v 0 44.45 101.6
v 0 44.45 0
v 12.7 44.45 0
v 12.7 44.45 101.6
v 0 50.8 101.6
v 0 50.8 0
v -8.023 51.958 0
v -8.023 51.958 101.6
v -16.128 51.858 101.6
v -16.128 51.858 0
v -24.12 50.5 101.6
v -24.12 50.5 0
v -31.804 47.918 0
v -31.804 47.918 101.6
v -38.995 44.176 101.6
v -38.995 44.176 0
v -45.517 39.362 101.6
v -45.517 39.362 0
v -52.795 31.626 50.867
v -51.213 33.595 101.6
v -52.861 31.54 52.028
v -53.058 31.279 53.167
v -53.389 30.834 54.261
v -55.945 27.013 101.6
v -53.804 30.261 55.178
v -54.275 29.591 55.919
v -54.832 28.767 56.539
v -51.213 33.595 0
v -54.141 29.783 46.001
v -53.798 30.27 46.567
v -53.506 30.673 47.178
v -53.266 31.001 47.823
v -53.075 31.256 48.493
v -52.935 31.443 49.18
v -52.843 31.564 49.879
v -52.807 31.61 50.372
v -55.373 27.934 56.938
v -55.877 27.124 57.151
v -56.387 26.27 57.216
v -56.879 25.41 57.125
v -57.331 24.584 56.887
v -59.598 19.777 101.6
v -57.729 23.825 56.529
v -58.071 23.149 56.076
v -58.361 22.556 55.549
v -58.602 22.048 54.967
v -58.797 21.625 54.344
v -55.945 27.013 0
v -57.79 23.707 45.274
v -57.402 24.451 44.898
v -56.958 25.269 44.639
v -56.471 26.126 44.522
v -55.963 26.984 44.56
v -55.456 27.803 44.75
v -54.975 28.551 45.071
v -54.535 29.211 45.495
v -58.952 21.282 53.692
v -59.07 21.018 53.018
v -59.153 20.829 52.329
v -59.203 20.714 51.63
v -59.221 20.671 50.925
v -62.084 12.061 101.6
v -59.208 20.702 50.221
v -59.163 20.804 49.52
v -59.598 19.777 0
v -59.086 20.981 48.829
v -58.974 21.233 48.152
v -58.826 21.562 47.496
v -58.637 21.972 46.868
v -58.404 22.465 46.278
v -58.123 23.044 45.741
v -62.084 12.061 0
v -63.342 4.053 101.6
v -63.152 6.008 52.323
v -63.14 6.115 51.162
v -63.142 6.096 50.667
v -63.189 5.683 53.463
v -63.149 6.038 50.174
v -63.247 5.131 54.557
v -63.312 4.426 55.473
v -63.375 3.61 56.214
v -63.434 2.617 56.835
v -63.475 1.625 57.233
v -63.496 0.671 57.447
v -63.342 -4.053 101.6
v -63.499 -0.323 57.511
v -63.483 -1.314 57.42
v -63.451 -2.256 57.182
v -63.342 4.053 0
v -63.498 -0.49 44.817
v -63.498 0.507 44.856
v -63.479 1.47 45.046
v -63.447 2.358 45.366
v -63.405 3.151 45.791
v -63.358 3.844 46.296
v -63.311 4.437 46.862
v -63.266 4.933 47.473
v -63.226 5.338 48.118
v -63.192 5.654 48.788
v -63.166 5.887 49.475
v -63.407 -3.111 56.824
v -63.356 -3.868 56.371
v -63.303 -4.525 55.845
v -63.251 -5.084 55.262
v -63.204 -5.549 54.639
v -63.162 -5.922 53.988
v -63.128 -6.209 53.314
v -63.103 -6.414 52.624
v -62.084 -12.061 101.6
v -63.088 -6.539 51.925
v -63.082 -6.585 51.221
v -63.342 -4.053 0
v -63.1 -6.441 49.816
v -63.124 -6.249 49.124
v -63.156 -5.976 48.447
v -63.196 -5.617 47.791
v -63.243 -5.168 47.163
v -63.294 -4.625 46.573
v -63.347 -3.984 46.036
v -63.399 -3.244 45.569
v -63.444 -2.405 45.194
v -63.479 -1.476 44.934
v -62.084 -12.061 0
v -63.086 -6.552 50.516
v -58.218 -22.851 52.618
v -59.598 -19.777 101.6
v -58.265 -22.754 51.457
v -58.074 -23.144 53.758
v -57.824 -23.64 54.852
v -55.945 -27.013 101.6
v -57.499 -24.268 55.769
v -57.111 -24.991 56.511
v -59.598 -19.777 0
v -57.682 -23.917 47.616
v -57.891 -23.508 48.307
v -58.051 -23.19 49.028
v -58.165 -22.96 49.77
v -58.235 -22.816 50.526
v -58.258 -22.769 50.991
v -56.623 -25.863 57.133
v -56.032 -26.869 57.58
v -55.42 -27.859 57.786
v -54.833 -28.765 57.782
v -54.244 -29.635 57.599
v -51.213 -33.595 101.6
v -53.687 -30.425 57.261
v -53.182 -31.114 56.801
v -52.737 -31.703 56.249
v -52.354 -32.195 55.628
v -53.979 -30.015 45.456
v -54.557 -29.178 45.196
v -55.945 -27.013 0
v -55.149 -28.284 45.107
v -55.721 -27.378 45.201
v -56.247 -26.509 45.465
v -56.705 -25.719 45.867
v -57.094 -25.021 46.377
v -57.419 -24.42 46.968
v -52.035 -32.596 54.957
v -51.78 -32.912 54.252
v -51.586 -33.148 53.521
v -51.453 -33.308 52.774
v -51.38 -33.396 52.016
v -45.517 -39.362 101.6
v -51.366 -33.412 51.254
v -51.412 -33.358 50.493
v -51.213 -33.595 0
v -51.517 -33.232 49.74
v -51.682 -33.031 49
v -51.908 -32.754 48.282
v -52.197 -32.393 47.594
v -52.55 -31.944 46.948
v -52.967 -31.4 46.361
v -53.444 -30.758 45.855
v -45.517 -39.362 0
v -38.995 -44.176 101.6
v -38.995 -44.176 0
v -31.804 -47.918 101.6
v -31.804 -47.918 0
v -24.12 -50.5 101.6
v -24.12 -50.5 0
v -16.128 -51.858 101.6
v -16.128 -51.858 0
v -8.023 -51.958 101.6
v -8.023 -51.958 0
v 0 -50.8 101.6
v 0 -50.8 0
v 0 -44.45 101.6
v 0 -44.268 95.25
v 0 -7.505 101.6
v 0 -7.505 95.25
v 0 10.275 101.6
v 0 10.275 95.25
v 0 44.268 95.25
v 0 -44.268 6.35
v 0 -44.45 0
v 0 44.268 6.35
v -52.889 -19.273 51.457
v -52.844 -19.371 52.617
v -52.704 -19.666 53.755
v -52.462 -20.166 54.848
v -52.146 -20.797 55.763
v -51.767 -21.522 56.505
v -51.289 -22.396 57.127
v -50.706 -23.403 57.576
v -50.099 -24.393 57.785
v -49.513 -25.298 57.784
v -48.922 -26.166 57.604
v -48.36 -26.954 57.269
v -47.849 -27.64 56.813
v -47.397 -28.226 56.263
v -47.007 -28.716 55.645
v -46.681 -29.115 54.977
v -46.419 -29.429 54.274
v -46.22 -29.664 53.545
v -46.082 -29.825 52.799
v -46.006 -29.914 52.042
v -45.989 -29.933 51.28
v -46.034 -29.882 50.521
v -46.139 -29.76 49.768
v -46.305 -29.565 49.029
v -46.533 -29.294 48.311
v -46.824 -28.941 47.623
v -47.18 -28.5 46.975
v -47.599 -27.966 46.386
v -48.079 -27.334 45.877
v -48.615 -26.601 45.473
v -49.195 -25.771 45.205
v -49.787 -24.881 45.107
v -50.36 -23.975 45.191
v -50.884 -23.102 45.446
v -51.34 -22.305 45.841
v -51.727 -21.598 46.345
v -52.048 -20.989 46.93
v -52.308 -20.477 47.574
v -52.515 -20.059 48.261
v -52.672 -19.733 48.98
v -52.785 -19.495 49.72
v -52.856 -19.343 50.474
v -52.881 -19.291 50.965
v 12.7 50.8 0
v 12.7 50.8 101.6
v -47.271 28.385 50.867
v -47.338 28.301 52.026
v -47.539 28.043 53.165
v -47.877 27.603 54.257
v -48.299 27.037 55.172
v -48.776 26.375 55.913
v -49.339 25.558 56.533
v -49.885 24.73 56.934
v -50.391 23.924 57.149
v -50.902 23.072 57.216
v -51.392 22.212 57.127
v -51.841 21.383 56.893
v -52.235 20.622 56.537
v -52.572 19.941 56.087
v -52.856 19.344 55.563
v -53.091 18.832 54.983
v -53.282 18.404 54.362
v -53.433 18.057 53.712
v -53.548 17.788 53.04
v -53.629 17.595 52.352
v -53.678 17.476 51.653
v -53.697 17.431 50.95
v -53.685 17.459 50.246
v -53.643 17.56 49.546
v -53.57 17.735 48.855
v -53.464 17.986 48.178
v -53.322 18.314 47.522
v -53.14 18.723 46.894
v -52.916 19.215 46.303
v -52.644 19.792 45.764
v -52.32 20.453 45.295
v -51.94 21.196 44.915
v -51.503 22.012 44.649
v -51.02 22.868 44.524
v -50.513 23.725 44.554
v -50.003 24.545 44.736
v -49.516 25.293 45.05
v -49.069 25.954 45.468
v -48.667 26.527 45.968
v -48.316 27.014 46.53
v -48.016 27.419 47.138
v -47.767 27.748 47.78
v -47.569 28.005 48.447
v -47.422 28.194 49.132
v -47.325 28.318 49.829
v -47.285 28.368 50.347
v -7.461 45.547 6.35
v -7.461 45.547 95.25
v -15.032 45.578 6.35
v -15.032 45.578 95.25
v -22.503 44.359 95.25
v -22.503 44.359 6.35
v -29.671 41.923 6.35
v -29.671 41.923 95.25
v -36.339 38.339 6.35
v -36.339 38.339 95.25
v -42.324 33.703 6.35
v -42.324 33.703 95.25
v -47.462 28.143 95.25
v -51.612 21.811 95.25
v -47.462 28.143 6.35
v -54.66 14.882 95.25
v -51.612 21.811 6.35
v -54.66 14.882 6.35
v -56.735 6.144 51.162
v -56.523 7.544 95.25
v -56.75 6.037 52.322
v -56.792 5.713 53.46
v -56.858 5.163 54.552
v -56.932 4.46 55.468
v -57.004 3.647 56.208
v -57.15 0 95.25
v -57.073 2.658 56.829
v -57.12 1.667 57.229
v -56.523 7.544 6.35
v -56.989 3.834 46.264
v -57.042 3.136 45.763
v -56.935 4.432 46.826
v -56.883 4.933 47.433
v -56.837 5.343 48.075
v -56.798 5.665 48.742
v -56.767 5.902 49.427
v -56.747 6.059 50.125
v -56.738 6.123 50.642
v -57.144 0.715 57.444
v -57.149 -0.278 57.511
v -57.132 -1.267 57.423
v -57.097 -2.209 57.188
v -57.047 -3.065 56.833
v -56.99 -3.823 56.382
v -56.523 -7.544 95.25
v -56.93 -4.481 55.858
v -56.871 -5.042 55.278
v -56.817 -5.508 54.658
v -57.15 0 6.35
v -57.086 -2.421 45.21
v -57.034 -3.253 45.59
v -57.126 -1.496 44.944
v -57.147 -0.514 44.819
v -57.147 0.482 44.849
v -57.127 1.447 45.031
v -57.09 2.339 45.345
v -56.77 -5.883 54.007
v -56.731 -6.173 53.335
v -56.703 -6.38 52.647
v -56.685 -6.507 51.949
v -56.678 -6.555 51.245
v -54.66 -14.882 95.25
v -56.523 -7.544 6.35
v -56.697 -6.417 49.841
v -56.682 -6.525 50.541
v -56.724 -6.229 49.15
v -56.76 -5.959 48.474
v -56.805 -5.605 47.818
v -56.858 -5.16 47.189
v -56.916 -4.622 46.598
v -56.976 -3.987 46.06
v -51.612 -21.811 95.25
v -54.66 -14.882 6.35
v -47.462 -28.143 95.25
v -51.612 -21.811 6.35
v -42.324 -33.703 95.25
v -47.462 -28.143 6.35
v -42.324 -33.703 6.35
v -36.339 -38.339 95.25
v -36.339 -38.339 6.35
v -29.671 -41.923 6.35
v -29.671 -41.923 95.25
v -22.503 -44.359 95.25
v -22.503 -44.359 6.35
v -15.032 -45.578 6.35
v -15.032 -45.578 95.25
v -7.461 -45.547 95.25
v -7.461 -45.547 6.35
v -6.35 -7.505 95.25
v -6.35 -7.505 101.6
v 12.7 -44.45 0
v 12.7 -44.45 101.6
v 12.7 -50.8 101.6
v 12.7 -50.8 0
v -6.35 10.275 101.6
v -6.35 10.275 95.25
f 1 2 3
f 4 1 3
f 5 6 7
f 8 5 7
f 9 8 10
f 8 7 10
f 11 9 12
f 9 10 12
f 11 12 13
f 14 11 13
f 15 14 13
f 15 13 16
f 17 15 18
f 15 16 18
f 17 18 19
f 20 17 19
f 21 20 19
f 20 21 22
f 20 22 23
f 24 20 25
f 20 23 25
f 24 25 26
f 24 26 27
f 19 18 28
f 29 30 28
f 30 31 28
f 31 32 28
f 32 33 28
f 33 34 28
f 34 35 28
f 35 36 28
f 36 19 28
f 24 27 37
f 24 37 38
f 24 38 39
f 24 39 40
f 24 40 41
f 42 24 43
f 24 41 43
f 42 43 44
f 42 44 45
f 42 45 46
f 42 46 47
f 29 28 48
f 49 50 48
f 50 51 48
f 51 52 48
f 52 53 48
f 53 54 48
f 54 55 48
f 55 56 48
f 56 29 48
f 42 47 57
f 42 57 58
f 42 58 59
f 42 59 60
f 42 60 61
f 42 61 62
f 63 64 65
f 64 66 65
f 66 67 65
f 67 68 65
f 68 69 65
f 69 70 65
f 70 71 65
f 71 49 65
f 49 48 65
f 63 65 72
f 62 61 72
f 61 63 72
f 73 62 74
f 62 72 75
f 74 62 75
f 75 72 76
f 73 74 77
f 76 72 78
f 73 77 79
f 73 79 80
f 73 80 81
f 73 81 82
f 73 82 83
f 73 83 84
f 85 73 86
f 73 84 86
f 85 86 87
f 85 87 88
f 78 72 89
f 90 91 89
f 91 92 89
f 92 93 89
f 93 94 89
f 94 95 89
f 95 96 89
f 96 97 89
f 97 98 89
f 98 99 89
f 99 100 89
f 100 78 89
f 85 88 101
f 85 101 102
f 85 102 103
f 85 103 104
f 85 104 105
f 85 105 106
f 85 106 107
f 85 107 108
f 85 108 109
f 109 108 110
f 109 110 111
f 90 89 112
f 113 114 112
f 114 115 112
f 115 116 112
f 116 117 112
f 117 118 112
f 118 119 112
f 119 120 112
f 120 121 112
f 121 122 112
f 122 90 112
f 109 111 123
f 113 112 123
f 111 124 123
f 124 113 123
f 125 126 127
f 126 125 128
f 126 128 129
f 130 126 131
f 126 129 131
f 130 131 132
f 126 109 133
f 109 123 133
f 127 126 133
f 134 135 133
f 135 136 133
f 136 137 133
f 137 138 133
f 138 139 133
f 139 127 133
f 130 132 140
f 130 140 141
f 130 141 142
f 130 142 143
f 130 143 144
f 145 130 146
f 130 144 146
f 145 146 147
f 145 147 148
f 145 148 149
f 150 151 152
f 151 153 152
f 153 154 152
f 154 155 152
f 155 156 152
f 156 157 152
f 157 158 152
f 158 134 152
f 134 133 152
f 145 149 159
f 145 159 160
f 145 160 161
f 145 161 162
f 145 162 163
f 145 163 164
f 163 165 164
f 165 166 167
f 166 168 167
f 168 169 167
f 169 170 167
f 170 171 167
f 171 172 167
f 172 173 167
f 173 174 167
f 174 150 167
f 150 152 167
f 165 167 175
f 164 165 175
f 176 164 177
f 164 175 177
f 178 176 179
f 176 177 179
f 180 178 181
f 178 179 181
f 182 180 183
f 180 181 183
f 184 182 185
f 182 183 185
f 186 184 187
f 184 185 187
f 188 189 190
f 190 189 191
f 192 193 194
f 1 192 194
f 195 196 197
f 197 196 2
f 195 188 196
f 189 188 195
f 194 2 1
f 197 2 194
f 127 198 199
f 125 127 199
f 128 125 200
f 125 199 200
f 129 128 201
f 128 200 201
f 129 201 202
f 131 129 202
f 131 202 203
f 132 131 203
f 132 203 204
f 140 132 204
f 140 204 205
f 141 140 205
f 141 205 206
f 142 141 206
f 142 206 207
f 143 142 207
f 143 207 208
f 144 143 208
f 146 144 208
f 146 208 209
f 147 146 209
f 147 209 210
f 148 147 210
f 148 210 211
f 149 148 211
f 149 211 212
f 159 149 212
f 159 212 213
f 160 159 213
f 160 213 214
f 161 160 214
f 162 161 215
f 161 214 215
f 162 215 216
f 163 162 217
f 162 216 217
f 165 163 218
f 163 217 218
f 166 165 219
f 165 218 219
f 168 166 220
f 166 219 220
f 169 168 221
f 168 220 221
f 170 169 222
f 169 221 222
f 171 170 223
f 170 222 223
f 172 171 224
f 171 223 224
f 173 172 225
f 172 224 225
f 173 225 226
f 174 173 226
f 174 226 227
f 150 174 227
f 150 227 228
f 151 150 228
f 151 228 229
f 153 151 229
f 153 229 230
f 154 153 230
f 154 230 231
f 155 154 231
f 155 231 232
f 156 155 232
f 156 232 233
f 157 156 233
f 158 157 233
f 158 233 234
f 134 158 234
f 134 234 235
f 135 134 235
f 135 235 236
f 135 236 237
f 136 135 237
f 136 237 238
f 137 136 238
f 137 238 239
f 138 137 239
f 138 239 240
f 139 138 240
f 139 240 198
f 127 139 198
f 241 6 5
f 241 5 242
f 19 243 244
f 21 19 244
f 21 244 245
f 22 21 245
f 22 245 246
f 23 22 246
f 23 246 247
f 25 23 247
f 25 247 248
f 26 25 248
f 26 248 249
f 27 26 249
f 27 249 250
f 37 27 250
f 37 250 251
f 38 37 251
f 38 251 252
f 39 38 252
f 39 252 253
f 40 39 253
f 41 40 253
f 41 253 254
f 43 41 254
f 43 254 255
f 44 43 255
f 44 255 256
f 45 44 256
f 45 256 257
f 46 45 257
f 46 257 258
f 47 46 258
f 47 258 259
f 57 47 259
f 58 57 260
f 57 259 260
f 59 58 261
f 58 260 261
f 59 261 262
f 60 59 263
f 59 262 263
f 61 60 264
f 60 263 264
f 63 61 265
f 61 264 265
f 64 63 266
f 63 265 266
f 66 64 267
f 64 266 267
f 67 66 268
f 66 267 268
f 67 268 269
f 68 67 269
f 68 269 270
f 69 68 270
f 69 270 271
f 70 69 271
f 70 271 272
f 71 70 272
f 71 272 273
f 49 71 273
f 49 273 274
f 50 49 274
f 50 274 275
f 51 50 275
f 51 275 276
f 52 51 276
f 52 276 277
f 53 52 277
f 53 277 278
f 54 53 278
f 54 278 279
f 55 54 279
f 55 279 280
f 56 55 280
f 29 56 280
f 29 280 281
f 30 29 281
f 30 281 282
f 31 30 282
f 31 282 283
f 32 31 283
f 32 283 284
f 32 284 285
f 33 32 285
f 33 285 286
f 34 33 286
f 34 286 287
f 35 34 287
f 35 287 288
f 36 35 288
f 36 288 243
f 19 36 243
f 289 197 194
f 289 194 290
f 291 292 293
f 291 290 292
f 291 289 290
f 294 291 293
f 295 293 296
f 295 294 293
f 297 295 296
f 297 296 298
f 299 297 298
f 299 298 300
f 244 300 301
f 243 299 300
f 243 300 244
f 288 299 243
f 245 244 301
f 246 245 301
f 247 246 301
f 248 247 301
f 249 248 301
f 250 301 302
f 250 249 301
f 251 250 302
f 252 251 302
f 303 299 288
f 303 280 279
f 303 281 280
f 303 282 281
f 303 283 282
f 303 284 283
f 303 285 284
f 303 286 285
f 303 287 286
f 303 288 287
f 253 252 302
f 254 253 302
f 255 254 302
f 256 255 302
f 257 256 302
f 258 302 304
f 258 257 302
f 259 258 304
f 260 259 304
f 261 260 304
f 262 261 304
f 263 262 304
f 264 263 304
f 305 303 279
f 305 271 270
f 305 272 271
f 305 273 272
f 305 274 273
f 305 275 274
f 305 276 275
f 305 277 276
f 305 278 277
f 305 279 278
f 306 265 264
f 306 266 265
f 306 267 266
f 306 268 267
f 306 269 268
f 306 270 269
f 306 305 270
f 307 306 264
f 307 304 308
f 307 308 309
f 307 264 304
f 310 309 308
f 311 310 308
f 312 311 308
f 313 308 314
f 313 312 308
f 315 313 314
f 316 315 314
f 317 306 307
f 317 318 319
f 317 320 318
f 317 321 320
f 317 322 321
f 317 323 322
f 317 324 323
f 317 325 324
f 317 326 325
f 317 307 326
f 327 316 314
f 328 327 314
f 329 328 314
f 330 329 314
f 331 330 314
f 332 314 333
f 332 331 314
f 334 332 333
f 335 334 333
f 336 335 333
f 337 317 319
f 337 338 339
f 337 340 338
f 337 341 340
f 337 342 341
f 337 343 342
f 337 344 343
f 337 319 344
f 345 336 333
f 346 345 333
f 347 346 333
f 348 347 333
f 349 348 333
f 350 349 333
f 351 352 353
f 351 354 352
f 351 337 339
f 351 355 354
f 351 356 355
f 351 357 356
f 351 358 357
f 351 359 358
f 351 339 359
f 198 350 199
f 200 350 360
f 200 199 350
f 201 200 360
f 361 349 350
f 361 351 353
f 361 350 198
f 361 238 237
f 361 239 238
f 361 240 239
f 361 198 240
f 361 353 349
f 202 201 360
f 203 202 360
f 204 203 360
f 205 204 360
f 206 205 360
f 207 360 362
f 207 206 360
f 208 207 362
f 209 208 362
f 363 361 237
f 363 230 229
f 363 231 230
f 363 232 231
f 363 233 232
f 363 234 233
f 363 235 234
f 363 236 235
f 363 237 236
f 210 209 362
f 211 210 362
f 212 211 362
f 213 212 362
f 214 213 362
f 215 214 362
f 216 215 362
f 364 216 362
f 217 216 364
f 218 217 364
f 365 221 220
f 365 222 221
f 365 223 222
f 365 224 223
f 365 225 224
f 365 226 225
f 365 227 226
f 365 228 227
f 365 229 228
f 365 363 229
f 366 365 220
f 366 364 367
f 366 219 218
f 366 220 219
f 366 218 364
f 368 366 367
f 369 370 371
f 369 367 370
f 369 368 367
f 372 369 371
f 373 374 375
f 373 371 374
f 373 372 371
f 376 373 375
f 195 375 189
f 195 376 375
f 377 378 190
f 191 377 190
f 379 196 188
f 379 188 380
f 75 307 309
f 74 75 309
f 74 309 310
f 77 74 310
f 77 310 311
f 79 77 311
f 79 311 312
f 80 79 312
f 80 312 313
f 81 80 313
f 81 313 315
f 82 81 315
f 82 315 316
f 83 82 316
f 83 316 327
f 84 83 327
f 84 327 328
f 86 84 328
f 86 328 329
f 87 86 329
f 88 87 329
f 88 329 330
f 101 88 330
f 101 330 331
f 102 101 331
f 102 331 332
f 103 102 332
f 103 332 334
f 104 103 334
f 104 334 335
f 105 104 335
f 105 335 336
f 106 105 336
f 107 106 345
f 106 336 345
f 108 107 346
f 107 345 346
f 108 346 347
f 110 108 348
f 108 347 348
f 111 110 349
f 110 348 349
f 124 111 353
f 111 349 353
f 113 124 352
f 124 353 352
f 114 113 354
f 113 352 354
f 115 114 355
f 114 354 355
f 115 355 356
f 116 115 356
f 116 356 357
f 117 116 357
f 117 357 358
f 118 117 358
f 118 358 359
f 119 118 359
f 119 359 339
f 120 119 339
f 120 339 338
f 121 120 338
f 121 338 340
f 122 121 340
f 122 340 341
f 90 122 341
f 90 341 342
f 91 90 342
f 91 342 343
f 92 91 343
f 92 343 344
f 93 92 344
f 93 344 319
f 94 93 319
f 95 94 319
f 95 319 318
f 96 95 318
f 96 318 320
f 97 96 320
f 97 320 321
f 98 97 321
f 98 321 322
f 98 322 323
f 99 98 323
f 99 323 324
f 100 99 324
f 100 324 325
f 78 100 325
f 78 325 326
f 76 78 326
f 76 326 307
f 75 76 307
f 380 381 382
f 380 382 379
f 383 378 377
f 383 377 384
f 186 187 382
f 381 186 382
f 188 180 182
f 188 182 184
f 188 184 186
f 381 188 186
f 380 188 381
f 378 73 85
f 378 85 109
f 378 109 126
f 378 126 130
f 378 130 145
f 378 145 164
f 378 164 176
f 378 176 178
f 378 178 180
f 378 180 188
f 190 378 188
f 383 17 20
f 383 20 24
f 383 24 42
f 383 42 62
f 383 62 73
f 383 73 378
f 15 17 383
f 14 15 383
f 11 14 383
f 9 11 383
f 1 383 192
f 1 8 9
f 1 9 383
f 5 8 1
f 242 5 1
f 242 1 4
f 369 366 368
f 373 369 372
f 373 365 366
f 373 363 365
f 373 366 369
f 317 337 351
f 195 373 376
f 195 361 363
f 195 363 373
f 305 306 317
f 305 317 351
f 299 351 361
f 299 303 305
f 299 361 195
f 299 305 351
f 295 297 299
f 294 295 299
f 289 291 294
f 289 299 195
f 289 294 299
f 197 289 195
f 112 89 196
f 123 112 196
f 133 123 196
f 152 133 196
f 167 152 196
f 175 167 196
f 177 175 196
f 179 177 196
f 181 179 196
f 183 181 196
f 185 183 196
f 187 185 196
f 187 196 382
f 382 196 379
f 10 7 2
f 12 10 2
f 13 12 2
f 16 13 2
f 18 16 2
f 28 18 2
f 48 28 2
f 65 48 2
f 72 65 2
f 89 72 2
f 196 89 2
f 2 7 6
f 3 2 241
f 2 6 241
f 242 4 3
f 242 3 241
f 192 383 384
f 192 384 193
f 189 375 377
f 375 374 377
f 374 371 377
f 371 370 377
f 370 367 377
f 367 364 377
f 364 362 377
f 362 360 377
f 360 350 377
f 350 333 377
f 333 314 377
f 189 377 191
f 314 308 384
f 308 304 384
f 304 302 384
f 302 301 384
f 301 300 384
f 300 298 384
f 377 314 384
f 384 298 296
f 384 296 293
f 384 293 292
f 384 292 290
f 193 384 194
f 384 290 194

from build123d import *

# Parameters (mm, degrees)
BOSS_EXTRUDE1_DEPTH                      = 101.6
SHELL1_T                                 = -6.35
SKETCH3_W                                = 6.35
SKETCH3_H                                = 17.78
CUT_EXTRUDE1_DEPTH                       = 6.35
SKETCH4_W                                = 12.7
SKETCH4_H                                = 6.35
BOSS_EXTRUDE2_DEPTH                      = 101.6
SKETCH6_W                                = 12.7
SKETCH6_H                                = 6.35
BOSS_EXTRUDE3_DEPTH                      = 101.6
F_1_2_0_5_DIAMETER_HOLE1_D               = 12.7
F_1_2_0_5_DIAMETER_HOLE1_DEPTH           = 7.62
F_1_2_0_5_DIAMETER_HOLE1_TIP             = 3.815464931
F_1_2_0_5_DIAMETER_HOLE1_ON_FACE_2_D     = 12.7
F_1_2_0_5_DIAMETER_HOLE1_ON_FACE_2_DEPTH = 7.62
F_1_2_0_5_DIAMETER_HOLE1_ON_FACE_2_TIP   = 3.815464931
F_1_2_0_5_DIAMETER_HOLE1_ON_FACE_3_D     = 12.7
F_1_2_0_5_DIAMETER_HOLE1_ON_FACE_3_DEPTH = 7.62
F_1_2_0_5_DIAMETER_HOLE1_ON_FACE_3_TIP   = 3.815464931


with BuildPart() as part:
    # Sketch2 → Boss-Extrude1 (new body)
    with BuildSketch(Plane.XY):
        with BuildLine():
            Line((0, -50.8), (0, 0))
            Line((0, 0), (0, 50.8))
            ThreePointArc((0, 50.8), (-63.5, 0), (0, -50.8))
        make_face()
    extrude(amount=BOSS_EXTRUDE1_DEPTH)

    # Shell1
    shell1_openings = [part.faces().sort_by_distance(p)[0] for p in [
        (0, 0, 50.8),
    ]]
    offset(amount=SHELL1_T, openings=shell1_openings)

    # Sketch3 → Cut-Extrude1 (cut)
    with BuildSketch(Plane.XY.offset(101.6)):
        with Locations((-3.175, 1.38458233)):
            Rectangle(SKETCH3_W, SKETCH3_H)
    extrude(amount=-CUT_EXTRUDE1_DEPTH, mode=Mode.SUBTRACT)

    # Sketch4 → Boss-Extrude2 (add)
    with BuildSketch(Plane.XY.offset(101.6)):
        with Locations((6.35, 47.625)):
            Rectangle(SKETCH4_W, SKETCH4_H)
    extrude(amount=-BOSS_EXTRUDE2_DEPTH)

    # Sketch6 → Boss-Extrude3 (add)
    with BuildSketch(Plane.XY.offset(101.6)):
        with Locations((6.35, -47.625)):
            Rectangle(SKETCH6_W, SKETCH6_H)
    extrude(amount=-BOSS_EXTRUDE3_DEPTH)

    # 1/2 (0.5) Diameter Hole1
    with Locations(Plane(origin=(-63.499461497, -0.236811011, 51.161863275), x_dir=(0.004547935689, -0.999989658087, 0), z_dir=(-0.999989658087, -0.004547935689, 0))):
        with Locations((0, 0)):
            Hole(F_1_2_0_5_DIAMETER_HOLE1_D / 2, depth=F_1_2_0_5_DIAMETER_HOLE1_DEPTH)
            with Locations((0, 0, -(F_1_2_0_5_DIAMETER_HOLE1_DEPTH + F_1_2_0_5_DIAMETER_HOLE1_TIP / 2))):  # 118° drill point
                Cone(0, F_1_2_0_5_DIAMETER_HOLE1_D / 2, F_1_2_0_5_DIAMETER_HOLE1_TIP, mode=Mode.SUBTRACT)

    # 1/2 (0.5) Diameter Hole1 on face 2
    with Locations(Plane(origin=(-55.14102988, -28.295419537, 51.457217049), x_dir=(0.543410902455, -0.839466849312, 0), z_dir=(-0.839466849312, -0.543410902455, 0))):
        with Locations((0, 0)):
            Hole(F_1_2_0_5_DIAMETER_HOLE1_ON_FACE_2_D / 2, depth=F_1_2_0_5_DIAMETER_HOLE1_ON_FACE_2_DEPTH)
            with Locations((0, 0, -(F_1_2_0_5_DIAMETER_HOLE1_ON_FACE_2_DEPTH + F_1_2_0_5_DIAMETER_HOLE1_ON_FACE_2_TIP / 2))):  # 118° drill point
                Cone(0, F_1_2_0_5_DIAMETER_HOLE1_ON_FACE_2_D / 2, F_1_2_0_5_DIAMETER_HOLE1_ON_FACE_2_TIP, mode=Mode.SUBTRACT)

    # 1/2 (0.5) Diameter Hole1 on face 3
    with Locations(Plane(origin=(-56.343520967, 26.345028645, 50.866509501), x_dir=(-0.505954201442, -0.862560343422, 0), z_dir=(-0.862560343422, 0.505954201442, 0))):
        with Locations((0, 0)):
            Hole(F_1_2_0_5_DIAMETER_HOLE1_ON_FACE_3_D / 2, depth=F_1_2_0_5_DIAMETER_HOLE1_ON_FACE_3_DEPTH)
            with Locations((0, 0, -(F_1_2_0_5_DIAMETER_HOLE1_ON_FACE_3_DEPTH + F_1_2_0_5_DIAMETER_HOLE1_ON_FACE_3_TIP / 2))):  # 118° drill point
                Cone(0, F_1_2_0_5_DIAMETER_HOLE1_ON_FACE_3_D / 2, F_1_2_0_5_DIAMETER_HOLE1_ON_FACE_3_TIP, mode=Mode.SUBTRACT)


solid = part.part
